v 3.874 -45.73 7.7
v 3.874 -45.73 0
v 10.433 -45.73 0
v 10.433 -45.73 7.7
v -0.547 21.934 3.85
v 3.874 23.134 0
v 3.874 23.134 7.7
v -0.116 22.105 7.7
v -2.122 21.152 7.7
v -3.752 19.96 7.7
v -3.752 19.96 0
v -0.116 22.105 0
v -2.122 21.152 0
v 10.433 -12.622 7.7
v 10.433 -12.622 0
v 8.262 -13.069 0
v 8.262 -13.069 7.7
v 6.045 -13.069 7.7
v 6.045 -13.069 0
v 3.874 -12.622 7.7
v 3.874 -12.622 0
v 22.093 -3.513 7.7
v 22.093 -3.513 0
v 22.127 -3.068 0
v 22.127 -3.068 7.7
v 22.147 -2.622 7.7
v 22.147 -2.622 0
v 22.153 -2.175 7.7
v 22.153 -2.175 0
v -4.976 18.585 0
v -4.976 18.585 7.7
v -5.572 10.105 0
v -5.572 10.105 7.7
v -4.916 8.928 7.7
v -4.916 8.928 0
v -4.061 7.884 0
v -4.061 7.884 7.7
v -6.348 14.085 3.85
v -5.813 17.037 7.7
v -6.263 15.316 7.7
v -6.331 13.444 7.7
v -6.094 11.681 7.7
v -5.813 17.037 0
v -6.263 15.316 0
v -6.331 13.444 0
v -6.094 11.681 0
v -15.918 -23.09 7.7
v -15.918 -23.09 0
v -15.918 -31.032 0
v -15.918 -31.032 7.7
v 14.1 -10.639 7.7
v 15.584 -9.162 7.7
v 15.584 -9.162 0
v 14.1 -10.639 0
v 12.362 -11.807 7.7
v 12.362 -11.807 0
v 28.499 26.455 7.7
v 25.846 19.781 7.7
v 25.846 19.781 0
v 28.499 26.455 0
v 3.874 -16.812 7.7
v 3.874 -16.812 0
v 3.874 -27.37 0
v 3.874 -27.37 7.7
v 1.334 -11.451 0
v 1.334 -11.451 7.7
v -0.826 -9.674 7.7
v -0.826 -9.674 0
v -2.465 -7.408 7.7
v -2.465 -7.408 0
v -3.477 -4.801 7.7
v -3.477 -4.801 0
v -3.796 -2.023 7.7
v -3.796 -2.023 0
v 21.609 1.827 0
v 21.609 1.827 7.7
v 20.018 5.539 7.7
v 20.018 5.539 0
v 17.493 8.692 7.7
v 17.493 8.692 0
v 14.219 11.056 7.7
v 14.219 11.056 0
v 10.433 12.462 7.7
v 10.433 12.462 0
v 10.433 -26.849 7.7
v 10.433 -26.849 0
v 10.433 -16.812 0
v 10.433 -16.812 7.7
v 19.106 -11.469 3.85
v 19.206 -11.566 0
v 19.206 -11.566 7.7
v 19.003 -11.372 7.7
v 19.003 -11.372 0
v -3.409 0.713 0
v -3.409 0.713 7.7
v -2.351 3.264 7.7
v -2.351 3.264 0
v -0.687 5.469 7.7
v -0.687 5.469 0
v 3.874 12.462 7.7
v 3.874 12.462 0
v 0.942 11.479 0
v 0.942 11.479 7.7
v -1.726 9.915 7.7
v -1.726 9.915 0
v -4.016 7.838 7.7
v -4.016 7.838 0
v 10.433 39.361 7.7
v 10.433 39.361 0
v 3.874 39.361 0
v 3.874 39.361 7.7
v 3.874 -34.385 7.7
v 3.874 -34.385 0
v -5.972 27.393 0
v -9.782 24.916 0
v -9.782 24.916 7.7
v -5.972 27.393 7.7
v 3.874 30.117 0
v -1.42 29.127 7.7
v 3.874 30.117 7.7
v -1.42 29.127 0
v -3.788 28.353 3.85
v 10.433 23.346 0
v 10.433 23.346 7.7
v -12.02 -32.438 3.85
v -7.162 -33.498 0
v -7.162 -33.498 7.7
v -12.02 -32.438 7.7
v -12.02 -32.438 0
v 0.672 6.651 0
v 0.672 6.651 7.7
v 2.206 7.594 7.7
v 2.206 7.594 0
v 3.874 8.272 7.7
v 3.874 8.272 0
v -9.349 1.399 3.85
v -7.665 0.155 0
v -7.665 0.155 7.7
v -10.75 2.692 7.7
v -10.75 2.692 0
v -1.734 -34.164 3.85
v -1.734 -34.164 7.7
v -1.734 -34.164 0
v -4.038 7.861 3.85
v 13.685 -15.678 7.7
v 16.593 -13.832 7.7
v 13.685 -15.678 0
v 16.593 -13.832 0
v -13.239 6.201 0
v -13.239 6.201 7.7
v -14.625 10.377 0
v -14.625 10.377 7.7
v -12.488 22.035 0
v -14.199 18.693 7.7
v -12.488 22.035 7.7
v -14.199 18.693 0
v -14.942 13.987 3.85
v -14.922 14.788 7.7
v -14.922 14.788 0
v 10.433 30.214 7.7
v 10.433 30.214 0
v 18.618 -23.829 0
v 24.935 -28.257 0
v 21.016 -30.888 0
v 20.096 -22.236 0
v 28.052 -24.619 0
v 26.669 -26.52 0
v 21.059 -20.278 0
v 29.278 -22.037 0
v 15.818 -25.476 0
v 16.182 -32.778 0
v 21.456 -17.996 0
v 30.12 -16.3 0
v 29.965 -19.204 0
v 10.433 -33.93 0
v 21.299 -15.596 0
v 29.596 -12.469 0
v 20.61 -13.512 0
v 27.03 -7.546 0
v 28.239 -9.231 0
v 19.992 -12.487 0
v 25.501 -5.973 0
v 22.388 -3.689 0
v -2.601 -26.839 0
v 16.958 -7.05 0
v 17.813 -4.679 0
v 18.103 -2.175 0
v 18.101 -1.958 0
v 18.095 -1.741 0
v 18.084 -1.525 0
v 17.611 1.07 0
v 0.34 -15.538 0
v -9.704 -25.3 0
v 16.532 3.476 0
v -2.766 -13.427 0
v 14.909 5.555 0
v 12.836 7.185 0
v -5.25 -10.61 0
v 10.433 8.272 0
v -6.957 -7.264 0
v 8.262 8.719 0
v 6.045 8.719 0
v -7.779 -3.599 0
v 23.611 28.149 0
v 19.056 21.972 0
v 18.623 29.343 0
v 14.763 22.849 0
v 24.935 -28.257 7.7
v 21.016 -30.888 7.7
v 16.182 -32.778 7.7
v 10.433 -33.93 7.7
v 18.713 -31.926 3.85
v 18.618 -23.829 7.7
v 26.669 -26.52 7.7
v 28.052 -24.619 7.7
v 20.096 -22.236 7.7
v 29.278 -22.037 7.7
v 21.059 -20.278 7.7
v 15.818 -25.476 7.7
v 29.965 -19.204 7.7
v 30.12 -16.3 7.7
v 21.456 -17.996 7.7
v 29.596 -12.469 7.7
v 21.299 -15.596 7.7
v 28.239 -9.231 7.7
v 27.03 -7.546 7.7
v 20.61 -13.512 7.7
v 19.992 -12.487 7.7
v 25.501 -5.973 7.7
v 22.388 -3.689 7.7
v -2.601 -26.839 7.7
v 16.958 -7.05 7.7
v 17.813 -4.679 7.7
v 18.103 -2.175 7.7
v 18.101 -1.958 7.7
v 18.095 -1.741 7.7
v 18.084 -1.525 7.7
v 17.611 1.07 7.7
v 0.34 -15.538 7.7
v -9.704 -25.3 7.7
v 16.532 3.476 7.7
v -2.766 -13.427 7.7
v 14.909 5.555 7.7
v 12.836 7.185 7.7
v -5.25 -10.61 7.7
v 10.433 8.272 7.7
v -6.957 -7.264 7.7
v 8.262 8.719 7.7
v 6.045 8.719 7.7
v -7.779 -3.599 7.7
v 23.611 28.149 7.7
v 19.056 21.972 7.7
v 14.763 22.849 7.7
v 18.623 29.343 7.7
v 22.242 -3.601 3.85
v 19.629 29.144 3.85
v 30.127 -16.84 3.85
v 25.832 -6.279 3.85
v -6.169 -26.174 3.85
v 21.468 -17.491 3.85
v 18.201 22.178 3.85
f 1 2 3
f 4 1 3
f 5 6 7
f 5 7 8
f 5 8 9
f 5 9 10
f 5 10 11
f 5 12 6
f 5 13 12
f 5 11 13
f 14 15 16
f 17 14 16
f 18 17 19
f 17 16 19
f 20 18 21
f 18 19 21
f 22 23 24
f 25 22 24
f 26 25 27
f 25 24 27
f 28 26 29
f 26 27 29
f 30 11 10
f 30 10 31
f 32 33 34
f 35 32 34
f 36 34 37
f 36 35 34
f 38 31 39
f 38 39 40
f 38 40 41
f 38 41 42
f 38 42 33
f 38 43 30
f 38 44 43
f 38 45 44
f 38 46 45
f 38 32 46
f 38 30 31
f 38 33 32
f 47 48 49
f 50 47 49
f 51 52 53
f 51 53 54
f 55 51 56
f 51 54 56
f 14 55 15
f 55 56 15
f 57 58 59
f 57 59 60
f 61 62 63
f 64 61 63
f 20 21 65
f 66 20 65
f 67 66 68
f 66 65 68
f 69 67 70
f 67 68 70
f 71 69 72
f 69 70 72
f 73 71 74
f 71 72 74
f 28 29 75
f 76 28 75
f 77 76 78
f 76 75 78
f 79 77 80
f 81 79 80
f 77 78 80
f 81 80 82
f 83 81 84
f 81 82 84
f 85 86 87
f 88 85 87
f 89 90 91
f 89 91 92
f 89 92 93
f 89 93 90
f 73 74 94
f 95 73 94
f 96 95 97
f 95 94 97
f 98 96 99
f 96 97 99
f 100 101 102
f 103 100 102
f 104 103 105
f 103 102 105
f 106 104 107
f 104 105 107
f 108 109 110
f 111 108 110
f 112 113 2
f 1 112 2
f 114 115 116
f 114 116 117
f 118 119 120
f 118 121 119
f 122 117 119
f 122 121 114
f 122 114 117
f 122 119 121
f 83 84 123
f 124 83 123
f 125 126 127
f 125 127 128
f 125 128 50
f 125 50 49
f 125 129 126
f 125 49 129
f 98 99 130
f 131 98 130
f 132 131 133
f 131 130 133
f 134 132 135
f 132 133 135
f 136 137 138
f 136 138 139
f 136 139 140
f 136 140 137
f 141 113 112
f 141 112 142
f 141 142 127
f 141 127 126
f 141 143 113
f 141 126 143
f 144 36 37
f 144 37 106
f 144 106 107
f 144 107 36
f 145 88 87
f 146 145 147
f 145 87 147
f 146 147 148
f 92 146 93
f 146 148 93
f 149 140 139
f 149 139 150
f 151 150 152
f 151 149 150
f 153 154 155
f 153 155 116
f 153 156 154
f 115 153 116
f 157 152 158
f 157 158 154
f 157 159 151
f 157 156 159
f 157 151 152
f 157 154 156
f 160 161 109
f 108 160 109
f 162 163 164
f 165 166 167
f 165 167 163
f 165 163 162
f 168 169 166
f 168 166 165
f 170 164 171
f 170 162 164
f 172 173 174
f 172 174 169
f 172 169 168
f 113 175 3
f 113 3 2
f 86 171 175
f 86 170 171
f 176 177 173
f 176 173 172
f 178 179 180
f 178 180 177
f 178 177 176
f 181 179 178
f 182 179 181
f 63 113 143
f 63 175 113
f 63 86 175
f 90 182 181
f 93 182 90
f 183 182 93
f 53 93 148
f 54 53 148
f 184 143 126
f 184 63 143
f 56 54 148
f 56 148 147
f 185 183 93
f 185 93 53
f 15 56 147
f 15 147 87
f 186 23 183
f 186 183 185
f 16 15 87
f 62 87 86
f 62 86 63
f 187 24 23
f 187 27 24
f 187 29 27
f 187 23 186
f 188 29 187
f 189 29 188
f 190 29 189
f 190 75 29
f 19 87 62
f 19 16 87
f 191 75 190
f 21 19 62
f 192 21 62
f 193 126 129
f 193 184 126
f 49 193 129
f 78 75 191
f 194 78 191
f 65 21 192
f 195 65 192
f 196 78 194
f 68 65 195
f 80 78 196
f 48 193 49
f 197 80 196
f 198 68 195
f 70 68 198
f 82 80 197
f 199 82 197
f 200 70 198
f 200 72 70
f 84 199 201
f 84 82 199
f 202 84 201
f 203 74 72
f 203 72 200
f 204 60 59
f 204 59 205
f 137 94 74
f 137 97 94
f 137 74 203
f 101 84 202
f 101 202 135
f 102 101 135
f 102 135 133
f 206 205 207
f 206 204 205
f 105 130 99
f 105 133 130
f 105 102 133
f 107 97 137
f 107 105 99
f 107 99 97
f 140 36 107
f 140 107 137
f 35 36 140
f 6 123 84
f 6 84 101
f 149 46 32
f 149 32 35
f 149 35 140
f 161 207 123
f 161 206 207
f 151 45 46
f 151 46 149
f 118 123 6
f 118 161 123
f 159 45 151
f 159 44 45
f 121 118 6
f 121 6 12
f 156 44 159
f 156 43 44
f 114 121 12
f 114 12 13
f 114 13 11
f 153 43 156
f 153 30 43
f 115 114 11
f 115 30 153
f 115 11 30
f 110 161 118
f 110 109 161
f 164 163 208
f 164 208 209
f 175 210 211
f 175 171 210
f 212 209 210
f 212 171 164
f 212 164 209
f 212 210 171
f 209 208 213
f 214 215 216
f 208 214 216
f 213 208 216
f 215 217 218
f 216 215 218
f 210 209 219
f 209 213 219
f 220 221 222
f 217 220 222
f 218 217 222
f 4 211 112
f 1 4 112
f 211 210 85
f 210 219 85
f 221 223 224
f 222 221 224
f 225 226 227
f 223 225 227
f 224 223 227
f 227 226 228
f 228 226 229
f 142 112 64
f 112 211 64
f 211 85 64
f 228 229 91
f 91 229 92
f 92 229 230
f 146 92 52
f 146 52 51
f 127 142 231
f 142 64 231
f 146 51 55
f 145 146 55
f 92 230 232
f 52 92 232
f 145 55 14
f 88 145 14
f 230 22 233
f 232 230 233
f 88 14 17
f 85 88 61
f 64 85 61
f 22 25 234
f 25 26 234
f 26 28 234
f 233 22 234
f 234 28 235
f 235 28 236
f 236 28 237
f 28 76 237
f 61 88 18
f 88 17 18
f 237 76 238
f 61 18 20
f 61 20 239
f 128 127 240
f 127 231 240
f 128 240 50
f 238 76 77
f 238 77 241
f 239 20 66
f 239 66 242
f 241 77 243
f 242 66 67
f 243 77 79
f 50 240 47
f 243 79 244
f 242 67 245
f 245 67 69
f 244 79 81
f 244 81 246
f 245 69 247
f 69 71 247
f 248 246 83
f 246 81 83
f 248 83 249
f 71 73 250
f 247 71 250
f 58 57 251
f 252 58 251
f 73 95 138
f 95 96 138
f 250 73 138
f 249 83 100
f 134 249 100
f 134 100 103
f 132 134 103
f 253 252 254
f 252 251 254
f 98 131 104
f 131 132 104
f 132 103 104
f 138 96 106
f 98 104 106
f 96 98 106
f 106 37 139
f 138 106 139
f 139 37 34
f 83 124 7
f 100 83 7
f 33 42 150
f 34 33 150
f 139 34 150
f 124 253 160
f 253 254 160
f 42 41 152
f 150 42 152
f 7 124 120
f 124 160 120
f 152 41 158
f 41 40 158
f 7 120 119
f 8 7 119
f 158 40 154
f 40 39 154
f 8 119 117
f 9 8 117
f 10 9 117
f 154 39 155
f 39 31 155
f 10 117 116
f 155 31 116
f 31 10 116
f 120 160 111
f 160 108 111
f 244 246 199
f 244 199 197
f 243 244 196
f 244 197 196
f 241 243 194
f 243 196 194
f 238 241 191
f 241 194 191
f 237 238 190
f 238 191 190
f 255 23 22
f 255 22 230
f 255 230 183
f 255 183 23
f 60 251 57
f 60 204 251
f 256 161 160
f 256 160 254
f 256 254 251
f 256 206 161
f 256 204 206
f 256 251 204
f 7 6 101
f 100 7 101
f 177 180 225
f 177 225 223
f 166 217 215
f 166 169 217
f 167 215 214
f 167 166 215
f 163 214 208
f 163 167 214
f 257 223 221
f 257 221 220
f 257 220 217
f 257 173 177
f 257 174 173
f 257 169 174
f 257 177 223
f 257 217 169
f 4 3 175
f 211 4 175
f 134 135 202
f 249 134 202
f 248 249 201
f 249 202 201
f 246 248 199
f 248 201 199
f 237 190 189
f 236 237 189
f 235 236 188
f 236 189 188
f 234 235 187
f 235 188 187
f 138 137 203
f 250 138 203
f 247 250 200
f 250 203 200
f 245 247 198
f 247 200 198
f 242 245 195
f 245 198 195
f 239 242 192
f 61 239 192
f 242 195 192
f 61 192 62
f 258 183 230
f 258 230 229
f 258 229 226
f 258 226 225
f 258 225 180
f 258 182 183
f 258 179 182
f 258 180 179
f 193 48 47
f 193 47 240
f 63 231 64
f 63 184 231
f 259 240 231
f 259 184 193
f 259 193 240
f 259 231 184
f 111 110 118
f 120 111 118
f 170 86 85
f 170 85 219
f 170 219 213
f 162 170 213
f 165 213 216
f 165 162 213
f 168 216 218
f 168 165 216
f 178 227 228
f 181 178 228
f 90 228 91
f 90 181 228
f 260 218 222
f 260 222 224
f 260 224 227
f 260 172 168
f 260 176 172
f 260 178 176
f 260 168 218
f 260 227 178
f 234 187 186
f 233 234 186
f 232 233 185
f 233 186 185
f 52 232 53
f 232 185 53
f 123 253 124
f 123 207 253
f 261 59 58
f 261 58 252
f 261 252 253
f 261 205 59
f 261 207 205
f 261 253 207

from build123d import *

# Parameters (mm, degrees)
F1_DEPTH = 7.7


with BuildPart() as f1:
    # F0 (on Top) → F1 (new body)
    with BuildSketch(Plane.XY):
        with BuildLine():
            add(Edge.make_bspline(
                [(22.0934028303, -3.5129354261), (22.2431585024, -3.6009011816), (22.3875659726, -3.6886724571)],
                knots=[0.9635630597, 0.9635630597, 0.9635630597, 1, 1, 1], degree=2))
            ThreePointArc((22.0934028303, -3.5129354261), (21.1126986682, -7.6642760258), (19.0031102486, -11.3717072292))
            add(Edge.make_bspline(
                [(19.2055998268, -11.5662766238), (19.1082850147, -11.4689618118), (19.0031102486, -11.3717072292)],
                knots=[0, 0, 0, 0.0430145471, 0.0430145471, 0.0430145471], degree=2))
            add(Edge.make_bspline(
                [(21.4679696184, -17.4907557905), (21.4679696184, -13.8286464155), (19.2055998268, -11.5662766238)],
                knots=[0, 0, 0, 1, 1, 1], degree=2))
            add(Edge.make_bspline(
                [(10.4328133684, -26.8494797488), (21.4679696184, -25.3358078738), (21.4679696184, -17.4907557905)],
                knots=[0, 0, 0, 1, 1, 1], degree=2))
            Line((10.4328133684, -26.8494797488), (10.4328133684, -16.8120794212))
            ThreePointArc((10.4328133684, -16.8120794212), (7.1531909726, -17.1750005821), (3.8735685768, -16.8120794212))
            Line((3.8735685768, -16.8120794212), (3.8735685768, -27.3703130821))
            add(Edge.make_bspline(
                [(-6.1687491316, -26.1740240196), (-0.6511710066, -27.3703130821), (3.8735685768, -27.3703130821)],
                knots=[0, 0, 0, 1, 1, 1], degree=2))
            add(Edge.make_bspline(
                [(-15.9180980899, -23.0897141238), (-11.6863272566, -24.9777349571), (-6.1687491316, -26.1740240196)],
                knots=[0, 0, 0, 1, 1, 1], degree=2))
            Line((-15.9180980899, -23.0897141238), (-15.9180980899, -31.0324224571))
            add(Edge.make_bspline(
                [(-7.1615876732, -33.4982427696), (-12.5001293399, -32.6111984988), (-15.9180980899, -31.0324224571)],
                knots=[0, 0, 0, 1, 1, 1], degree=2))
            add(Edge.make_bspline(
                [(3.8735685768, -34.3852870405), (-1.8230460066, -34.3852870405), (-7.1615876732, -33.4982427696)],
                knots=[0, 0, 0, 1, 1, 1], degree=2))
            Line((3.8735685768, -34.3852870405), (3.8735685768, -45.7296880821))
            Line((3.8735685768, -45.7296880821), (10.4328133684, -45.7296880821))
            Line((10.4328133684, -45.7296880821), (10.4328133684, -33.9295578738))
            add(Edge.make_bspline(
                [(24.9347664934, -28.257357353), (19.7427092018, -32.7576828738), (10.4328133684, -33.9295578738)],
                knots=[0, 0, 0, 1, 1, 1], degree=2))
            add(Edge.make_bspline(
                [(30.1268237851, -16.8397141238), (30.1268237851, -23.7570318321), (24.9347664934, -28.257357353)],
                knots=[0, 0, 0, 1, 1, 1], degree=2))
            add(Edge.make_bspline(
                [(28.2388029518, -9.2306646446), (30.1268237851, -12.3638026655), (30.1268237851, -16.8397141238)],
                knots=[0, 0, 0, 1, 1, 1], degree=2))
            add(Edge.make_bspline(
                [(22.3875659726, -3.6886724571), (26.3507821184, -6.0975266238), (28.2388029518, -9.2306646446)],
                knots=[0, 0, 0, 1, 1, 1], degree=2))
        make_face()
        with BuildLine():
            ThreePointArc((3.8735685768, 12.4620782569), (7.1531909726, 12.8249994179), (10.4328133684, 12.4620782569))
            Line((10.4328133684, 12.4620782569), (10.4328133684, 23.3458327512))
            add(Edge.make_bspline(
                [(25.8462248268, 19.7813796262), (18.2615894101, 22.7924473345), (10.4328133684, 23.3458327512)],
                knots=[0, 0, 0, 1, 1, 1], degree=2))
            Line((25.8462248268, 19.7813796262), (28.4992196184, 26.4545567095))
            add(Edge.make_bspline(
                [(10.4328133684, 30.2143223345), (19.7915373268, 29.9539056679), (28.4992196184, 26.4545567095)],
                knots=[0, 0, 0, 1, 1, 1], degree=2))
            Line((10.4328133684, 30.2143223345), (10.4328133684, 39.3614577512))
            Line((10.4328133684, 39.3614577512), (3.8735685768, 39.3614577512))
            Line((3.8735685768, 39.3614577512), (3.8735685768, 30.1166660845))
            add(Edge.make_bspline(
                [(-9.7820303816, 24.916470772), (-4.6225251732, 29.1889317095), (3.8735685768, 30.1166660845)],
                knots=[0, 0, 0, 1, 1, 1], degree=2))
            add(Edge.make_bspline(
                [(-14.9415355899, 13.9871087929), (-14.9415355899, 20.6440098345), (-9.7820303816, 24.916470772)],
                knots=[0, 0, 0, 1, 1, 1], degree=2))
            add(Edge.make_bspline(
                [(-10.7504548607, 2.6915358762), (-14.9415355899, 7.0697910845), (-14.9415355899, 13.9871087929)],
                knots=[0, 0, 0, 1, 1, 1], degree=2))
            add(Edge.make_bspline(
                [(-7.6647341063, 0.1550415541), (-9.489916275, 1.3747013925), (-10.7504548607, 2.6915358762)],
                knots=[0.6992330458, 0.6992330458, 0.6992330458, 1, 1, 1], degree=2))
            ThreePointArc((-7.6647341063, 0.1550415541), (-6.3961953475, 4.2603805526), (-4.0158241247, 7.8376465082))
            add(Edge.make_bspline(
                [(-4.0610017357, 7.8835931679), (-4.038574566, 7.8606073142), (-4.0158241247, 7.8376465082)],
                knots=[0, 0, 0, 0.0098072976, 0.0098072976, 0.0098072976], degree=2))
            add(Edge.make_bspline(
                [(-6.3477855899, 14.0847650429), (-6.3477855899, 10.2273431679), (-4.0610017357, 7.8835931679)],
                knots=[0, 0, 0, 1, 1, 1], degree=2))
            add(Edge.make_bspline(
                [(-3.7517569441, 19.9604160845), (-6.3477855899, 17.6003900429), (-6.3477855899, 14.0847650429)],
                knots=[0, 0, 0, 1, 1, 1], degree=2))
            add(Edge.make_bspline(
                [(3.8735685768, 23.1342442095), (-1.1557282982, 22.3204421262), (-3.7517569441, 19.9604160845)],
                knots=[0, 0, 0, 1, 1, 1], degree=2))
            Line((3.8735685768, 23.1342442095), (3.8735685768, 12.4620782569))
        make_face()
        with BuildLine():
            ThreePointArc((3.8735685768, -16.8120794212), (7.1531909726, -17.1750005821), (10.4328133684, -16.8120794212))
            Line((10.4328133684, -16.8120794212), (10.4328133684, -12.622324495))
            ThreePointArc((10.4328133684, -12.622324495), (7.1531909726, -13.1250005821), (3.8735685768, -12.622324495))
            Line((3.8735685768, -12.622324495), (3.8735685768, -16.8120794212))
        make_face()
        with BuildLine():
            Line((10.4328133684, 8.2723233307), (10.4328133684, 12.4620782569))
            ThreePointArc((10.4328133684, 12.4620782569), (7.1531909726, 12.8249994179), (3.8735685768, 12.4620782569))
            Line((3.8735685768, 12.4620782569), (3.8735685768, 8.2723233307))
            ThreePointArc((3.8735685768, 8.2723233307), (7.1531909726, 8.7749994179), (10.4328133684, 8.2723233307))
        make_face()
        with BuildLine():
            ThreePointArc((19.0031102486, -11.3717072292), (21.1126986682, -7.6642760258), (22.0934028303, -3.5129354261))
            add(Edge.make_bspline(
                [(18.0838779902, -1.5249380293), (20.4218137777, -2.5310521228), (22.0934028303, -3.5129354261)],
                knots=[0.5568499804, 0.5568499804, 0.5568499804, 0.9635630597, 0.9635630597, 0.9635630597], degree=2))
            ThreePointArc((18.0838779902, -1.5249380293), (18.0983616621, -1.849825893), (18.1031909726, -2.1750005821))
            ThreePointArc((18.1031909726, -2.1750005821), (17.4541754224, -5.8887883204), (15.584064148, -9.1623375213))
            add(Edge.make_bspline(
                [(19.0031102486, -11.3717072292), (17.8042308259, -10.2631093973), (15.584064148, -9.1623375213)],
                knots=[0.0430145471, 0.0430145471, 0.0430145471, 0.5333342058, 0.5333342058, 0.5333342058], degree=2))
        make_face()
        with BuildLine():
            add(Edge.make_bspline(
                [(-4.0158241247, 7.8376465082), (-2.8074328759, 6.6180817259), (-0.6870243927, 5.4691817173)],
                knots=[0.0098072976, 0.0098072976, 0.0098072976, 0.5307225792, 0.5307225792, 0.5307225792], degree=2))
            ThreePointArc((-4.0158241247, 7.8376465082), (-6.3961953475, 4.2603805526), (-7.6647341063, 0.1550415541))
            add(Edge.make_bspline(
                [(-3.7957490763, -2.0226463711), (-5.9728358213, -0.9755526541), (-7.6647341063, 0.1550415541)],
                knots=[0.4204295912, 0.4204295912, 0.4204295912, 0.6992330458, 0.6992330458, 0.6992330458], degree=2))
            ThreePointArc((-3.7957490763, -2.0226463711), (-2.960659052, 2.0217288206), (-0.6870243927, 5.4691817173))
        make_face()
        with BuildLine():
            add(Edge.make_bspline(
                [(-3.7957490763, -2.0226463711), (-5.9728358213, -0.9755526541), (-7.6647341063, 0.1550415541)],
                knots=[0.4204295912, 0.4204295912, 0.4204295912, 0.6992330458, 0.6992330458, 0.6992330458], degree=2))
            ThreePointArc((-7.6647341063, 0.1550415541), (-5.2504820599, -10.6099810387), (3.8735685768, -16.8120794212))
            Line((3.8735685768, -16.8120794212), (3.8735685768, -12.622324495))
            ThreePointArc((3.8735685768, -12.622324495), (-1.7181838585, -8.5938173427), (-3.7957490763, -2.0226463711))
        make_face()
        with BuildLine():
            ThreePointArc((10.4328133684, -16.8120794212), (15.1921691537, -14.8389190043), (19.0031102486, -11.3717072292))
            add(Edge.make_bspline(
                [(19.0031102486, -11.3717072292), (17.8042308259, -10.2631093973), (15.584064148, -9.1623375213)],
                knots=[0.0430145471, 0.0430145471, 0.0430145471, 0.5333342058, 0.5333342058, 0.5333342058], degree=2))
            ThreePointArc((15.584064148, -9.1623375213), (13.2586642627, -11.2648683427), (10.4328133684, -12.622324495))
            Line((10.4328133684, -12.622324495), (10.4328133684, -16.8120794212))
        make_face()
        with BuildLine():
            ThreePointArc((22.0934028303, -3.5129354261), (22.1382364825, -2.8446356075), (22.1531909726, -2.1750005821))
            ThreePointArc((22.1531909726, -2.1750005821), (18.8620409575, 7.2006504369), (10.4328133684, 12.4620782569))
            Line((10.4328133684, 12.4620782569), (10.4328133684, 8.2723233307))
            ThreePointArc((10.4328133684, 8.2723233307), (15.783359334, 4.5646354655), (18.0838779902, -1.5249380293))
            add(Edge.make_bspline(
                [(18.0838779902, -1.5249380293), (20.4218137777, -2.5310521228), (22.0934028303, -3.5129354261)],
                knots=[0.5568499804, 0.5568499804, 0.5568499804, 0.9635630597, 0.9635630597, 0.9635630597], degree=2))
        make_face()
        with BuildLine():
            Line((3.8735685768, 8.2723233307), (3.8735685768, 12.4620782569))
            ThreePointArc((3.8735685768, 12.4620782569), (-0.4321319343, 10.7657442341), (-4.0158241247, 7.8376465082))
            add(Edge.make_bspline(
                [(-4.0158241247, 7.8376465082), (-2.8074328759, 6.6180817259), (-0.6870243927, 5.4691817173)],
                knots=[0.0098072976, 0.0098072976, 0.0098072976, 0.5307225792, 0.5307225792, 0.5307225792], degree=2))
            ThreePointArc((-0.6870243927, 5.4691817173), (1.4193354909, 7.153740025), (3.8735685768, 8.2723233307))
        make_face()
    extrude(amount=F1_DEPTH)


solid = f1.part
